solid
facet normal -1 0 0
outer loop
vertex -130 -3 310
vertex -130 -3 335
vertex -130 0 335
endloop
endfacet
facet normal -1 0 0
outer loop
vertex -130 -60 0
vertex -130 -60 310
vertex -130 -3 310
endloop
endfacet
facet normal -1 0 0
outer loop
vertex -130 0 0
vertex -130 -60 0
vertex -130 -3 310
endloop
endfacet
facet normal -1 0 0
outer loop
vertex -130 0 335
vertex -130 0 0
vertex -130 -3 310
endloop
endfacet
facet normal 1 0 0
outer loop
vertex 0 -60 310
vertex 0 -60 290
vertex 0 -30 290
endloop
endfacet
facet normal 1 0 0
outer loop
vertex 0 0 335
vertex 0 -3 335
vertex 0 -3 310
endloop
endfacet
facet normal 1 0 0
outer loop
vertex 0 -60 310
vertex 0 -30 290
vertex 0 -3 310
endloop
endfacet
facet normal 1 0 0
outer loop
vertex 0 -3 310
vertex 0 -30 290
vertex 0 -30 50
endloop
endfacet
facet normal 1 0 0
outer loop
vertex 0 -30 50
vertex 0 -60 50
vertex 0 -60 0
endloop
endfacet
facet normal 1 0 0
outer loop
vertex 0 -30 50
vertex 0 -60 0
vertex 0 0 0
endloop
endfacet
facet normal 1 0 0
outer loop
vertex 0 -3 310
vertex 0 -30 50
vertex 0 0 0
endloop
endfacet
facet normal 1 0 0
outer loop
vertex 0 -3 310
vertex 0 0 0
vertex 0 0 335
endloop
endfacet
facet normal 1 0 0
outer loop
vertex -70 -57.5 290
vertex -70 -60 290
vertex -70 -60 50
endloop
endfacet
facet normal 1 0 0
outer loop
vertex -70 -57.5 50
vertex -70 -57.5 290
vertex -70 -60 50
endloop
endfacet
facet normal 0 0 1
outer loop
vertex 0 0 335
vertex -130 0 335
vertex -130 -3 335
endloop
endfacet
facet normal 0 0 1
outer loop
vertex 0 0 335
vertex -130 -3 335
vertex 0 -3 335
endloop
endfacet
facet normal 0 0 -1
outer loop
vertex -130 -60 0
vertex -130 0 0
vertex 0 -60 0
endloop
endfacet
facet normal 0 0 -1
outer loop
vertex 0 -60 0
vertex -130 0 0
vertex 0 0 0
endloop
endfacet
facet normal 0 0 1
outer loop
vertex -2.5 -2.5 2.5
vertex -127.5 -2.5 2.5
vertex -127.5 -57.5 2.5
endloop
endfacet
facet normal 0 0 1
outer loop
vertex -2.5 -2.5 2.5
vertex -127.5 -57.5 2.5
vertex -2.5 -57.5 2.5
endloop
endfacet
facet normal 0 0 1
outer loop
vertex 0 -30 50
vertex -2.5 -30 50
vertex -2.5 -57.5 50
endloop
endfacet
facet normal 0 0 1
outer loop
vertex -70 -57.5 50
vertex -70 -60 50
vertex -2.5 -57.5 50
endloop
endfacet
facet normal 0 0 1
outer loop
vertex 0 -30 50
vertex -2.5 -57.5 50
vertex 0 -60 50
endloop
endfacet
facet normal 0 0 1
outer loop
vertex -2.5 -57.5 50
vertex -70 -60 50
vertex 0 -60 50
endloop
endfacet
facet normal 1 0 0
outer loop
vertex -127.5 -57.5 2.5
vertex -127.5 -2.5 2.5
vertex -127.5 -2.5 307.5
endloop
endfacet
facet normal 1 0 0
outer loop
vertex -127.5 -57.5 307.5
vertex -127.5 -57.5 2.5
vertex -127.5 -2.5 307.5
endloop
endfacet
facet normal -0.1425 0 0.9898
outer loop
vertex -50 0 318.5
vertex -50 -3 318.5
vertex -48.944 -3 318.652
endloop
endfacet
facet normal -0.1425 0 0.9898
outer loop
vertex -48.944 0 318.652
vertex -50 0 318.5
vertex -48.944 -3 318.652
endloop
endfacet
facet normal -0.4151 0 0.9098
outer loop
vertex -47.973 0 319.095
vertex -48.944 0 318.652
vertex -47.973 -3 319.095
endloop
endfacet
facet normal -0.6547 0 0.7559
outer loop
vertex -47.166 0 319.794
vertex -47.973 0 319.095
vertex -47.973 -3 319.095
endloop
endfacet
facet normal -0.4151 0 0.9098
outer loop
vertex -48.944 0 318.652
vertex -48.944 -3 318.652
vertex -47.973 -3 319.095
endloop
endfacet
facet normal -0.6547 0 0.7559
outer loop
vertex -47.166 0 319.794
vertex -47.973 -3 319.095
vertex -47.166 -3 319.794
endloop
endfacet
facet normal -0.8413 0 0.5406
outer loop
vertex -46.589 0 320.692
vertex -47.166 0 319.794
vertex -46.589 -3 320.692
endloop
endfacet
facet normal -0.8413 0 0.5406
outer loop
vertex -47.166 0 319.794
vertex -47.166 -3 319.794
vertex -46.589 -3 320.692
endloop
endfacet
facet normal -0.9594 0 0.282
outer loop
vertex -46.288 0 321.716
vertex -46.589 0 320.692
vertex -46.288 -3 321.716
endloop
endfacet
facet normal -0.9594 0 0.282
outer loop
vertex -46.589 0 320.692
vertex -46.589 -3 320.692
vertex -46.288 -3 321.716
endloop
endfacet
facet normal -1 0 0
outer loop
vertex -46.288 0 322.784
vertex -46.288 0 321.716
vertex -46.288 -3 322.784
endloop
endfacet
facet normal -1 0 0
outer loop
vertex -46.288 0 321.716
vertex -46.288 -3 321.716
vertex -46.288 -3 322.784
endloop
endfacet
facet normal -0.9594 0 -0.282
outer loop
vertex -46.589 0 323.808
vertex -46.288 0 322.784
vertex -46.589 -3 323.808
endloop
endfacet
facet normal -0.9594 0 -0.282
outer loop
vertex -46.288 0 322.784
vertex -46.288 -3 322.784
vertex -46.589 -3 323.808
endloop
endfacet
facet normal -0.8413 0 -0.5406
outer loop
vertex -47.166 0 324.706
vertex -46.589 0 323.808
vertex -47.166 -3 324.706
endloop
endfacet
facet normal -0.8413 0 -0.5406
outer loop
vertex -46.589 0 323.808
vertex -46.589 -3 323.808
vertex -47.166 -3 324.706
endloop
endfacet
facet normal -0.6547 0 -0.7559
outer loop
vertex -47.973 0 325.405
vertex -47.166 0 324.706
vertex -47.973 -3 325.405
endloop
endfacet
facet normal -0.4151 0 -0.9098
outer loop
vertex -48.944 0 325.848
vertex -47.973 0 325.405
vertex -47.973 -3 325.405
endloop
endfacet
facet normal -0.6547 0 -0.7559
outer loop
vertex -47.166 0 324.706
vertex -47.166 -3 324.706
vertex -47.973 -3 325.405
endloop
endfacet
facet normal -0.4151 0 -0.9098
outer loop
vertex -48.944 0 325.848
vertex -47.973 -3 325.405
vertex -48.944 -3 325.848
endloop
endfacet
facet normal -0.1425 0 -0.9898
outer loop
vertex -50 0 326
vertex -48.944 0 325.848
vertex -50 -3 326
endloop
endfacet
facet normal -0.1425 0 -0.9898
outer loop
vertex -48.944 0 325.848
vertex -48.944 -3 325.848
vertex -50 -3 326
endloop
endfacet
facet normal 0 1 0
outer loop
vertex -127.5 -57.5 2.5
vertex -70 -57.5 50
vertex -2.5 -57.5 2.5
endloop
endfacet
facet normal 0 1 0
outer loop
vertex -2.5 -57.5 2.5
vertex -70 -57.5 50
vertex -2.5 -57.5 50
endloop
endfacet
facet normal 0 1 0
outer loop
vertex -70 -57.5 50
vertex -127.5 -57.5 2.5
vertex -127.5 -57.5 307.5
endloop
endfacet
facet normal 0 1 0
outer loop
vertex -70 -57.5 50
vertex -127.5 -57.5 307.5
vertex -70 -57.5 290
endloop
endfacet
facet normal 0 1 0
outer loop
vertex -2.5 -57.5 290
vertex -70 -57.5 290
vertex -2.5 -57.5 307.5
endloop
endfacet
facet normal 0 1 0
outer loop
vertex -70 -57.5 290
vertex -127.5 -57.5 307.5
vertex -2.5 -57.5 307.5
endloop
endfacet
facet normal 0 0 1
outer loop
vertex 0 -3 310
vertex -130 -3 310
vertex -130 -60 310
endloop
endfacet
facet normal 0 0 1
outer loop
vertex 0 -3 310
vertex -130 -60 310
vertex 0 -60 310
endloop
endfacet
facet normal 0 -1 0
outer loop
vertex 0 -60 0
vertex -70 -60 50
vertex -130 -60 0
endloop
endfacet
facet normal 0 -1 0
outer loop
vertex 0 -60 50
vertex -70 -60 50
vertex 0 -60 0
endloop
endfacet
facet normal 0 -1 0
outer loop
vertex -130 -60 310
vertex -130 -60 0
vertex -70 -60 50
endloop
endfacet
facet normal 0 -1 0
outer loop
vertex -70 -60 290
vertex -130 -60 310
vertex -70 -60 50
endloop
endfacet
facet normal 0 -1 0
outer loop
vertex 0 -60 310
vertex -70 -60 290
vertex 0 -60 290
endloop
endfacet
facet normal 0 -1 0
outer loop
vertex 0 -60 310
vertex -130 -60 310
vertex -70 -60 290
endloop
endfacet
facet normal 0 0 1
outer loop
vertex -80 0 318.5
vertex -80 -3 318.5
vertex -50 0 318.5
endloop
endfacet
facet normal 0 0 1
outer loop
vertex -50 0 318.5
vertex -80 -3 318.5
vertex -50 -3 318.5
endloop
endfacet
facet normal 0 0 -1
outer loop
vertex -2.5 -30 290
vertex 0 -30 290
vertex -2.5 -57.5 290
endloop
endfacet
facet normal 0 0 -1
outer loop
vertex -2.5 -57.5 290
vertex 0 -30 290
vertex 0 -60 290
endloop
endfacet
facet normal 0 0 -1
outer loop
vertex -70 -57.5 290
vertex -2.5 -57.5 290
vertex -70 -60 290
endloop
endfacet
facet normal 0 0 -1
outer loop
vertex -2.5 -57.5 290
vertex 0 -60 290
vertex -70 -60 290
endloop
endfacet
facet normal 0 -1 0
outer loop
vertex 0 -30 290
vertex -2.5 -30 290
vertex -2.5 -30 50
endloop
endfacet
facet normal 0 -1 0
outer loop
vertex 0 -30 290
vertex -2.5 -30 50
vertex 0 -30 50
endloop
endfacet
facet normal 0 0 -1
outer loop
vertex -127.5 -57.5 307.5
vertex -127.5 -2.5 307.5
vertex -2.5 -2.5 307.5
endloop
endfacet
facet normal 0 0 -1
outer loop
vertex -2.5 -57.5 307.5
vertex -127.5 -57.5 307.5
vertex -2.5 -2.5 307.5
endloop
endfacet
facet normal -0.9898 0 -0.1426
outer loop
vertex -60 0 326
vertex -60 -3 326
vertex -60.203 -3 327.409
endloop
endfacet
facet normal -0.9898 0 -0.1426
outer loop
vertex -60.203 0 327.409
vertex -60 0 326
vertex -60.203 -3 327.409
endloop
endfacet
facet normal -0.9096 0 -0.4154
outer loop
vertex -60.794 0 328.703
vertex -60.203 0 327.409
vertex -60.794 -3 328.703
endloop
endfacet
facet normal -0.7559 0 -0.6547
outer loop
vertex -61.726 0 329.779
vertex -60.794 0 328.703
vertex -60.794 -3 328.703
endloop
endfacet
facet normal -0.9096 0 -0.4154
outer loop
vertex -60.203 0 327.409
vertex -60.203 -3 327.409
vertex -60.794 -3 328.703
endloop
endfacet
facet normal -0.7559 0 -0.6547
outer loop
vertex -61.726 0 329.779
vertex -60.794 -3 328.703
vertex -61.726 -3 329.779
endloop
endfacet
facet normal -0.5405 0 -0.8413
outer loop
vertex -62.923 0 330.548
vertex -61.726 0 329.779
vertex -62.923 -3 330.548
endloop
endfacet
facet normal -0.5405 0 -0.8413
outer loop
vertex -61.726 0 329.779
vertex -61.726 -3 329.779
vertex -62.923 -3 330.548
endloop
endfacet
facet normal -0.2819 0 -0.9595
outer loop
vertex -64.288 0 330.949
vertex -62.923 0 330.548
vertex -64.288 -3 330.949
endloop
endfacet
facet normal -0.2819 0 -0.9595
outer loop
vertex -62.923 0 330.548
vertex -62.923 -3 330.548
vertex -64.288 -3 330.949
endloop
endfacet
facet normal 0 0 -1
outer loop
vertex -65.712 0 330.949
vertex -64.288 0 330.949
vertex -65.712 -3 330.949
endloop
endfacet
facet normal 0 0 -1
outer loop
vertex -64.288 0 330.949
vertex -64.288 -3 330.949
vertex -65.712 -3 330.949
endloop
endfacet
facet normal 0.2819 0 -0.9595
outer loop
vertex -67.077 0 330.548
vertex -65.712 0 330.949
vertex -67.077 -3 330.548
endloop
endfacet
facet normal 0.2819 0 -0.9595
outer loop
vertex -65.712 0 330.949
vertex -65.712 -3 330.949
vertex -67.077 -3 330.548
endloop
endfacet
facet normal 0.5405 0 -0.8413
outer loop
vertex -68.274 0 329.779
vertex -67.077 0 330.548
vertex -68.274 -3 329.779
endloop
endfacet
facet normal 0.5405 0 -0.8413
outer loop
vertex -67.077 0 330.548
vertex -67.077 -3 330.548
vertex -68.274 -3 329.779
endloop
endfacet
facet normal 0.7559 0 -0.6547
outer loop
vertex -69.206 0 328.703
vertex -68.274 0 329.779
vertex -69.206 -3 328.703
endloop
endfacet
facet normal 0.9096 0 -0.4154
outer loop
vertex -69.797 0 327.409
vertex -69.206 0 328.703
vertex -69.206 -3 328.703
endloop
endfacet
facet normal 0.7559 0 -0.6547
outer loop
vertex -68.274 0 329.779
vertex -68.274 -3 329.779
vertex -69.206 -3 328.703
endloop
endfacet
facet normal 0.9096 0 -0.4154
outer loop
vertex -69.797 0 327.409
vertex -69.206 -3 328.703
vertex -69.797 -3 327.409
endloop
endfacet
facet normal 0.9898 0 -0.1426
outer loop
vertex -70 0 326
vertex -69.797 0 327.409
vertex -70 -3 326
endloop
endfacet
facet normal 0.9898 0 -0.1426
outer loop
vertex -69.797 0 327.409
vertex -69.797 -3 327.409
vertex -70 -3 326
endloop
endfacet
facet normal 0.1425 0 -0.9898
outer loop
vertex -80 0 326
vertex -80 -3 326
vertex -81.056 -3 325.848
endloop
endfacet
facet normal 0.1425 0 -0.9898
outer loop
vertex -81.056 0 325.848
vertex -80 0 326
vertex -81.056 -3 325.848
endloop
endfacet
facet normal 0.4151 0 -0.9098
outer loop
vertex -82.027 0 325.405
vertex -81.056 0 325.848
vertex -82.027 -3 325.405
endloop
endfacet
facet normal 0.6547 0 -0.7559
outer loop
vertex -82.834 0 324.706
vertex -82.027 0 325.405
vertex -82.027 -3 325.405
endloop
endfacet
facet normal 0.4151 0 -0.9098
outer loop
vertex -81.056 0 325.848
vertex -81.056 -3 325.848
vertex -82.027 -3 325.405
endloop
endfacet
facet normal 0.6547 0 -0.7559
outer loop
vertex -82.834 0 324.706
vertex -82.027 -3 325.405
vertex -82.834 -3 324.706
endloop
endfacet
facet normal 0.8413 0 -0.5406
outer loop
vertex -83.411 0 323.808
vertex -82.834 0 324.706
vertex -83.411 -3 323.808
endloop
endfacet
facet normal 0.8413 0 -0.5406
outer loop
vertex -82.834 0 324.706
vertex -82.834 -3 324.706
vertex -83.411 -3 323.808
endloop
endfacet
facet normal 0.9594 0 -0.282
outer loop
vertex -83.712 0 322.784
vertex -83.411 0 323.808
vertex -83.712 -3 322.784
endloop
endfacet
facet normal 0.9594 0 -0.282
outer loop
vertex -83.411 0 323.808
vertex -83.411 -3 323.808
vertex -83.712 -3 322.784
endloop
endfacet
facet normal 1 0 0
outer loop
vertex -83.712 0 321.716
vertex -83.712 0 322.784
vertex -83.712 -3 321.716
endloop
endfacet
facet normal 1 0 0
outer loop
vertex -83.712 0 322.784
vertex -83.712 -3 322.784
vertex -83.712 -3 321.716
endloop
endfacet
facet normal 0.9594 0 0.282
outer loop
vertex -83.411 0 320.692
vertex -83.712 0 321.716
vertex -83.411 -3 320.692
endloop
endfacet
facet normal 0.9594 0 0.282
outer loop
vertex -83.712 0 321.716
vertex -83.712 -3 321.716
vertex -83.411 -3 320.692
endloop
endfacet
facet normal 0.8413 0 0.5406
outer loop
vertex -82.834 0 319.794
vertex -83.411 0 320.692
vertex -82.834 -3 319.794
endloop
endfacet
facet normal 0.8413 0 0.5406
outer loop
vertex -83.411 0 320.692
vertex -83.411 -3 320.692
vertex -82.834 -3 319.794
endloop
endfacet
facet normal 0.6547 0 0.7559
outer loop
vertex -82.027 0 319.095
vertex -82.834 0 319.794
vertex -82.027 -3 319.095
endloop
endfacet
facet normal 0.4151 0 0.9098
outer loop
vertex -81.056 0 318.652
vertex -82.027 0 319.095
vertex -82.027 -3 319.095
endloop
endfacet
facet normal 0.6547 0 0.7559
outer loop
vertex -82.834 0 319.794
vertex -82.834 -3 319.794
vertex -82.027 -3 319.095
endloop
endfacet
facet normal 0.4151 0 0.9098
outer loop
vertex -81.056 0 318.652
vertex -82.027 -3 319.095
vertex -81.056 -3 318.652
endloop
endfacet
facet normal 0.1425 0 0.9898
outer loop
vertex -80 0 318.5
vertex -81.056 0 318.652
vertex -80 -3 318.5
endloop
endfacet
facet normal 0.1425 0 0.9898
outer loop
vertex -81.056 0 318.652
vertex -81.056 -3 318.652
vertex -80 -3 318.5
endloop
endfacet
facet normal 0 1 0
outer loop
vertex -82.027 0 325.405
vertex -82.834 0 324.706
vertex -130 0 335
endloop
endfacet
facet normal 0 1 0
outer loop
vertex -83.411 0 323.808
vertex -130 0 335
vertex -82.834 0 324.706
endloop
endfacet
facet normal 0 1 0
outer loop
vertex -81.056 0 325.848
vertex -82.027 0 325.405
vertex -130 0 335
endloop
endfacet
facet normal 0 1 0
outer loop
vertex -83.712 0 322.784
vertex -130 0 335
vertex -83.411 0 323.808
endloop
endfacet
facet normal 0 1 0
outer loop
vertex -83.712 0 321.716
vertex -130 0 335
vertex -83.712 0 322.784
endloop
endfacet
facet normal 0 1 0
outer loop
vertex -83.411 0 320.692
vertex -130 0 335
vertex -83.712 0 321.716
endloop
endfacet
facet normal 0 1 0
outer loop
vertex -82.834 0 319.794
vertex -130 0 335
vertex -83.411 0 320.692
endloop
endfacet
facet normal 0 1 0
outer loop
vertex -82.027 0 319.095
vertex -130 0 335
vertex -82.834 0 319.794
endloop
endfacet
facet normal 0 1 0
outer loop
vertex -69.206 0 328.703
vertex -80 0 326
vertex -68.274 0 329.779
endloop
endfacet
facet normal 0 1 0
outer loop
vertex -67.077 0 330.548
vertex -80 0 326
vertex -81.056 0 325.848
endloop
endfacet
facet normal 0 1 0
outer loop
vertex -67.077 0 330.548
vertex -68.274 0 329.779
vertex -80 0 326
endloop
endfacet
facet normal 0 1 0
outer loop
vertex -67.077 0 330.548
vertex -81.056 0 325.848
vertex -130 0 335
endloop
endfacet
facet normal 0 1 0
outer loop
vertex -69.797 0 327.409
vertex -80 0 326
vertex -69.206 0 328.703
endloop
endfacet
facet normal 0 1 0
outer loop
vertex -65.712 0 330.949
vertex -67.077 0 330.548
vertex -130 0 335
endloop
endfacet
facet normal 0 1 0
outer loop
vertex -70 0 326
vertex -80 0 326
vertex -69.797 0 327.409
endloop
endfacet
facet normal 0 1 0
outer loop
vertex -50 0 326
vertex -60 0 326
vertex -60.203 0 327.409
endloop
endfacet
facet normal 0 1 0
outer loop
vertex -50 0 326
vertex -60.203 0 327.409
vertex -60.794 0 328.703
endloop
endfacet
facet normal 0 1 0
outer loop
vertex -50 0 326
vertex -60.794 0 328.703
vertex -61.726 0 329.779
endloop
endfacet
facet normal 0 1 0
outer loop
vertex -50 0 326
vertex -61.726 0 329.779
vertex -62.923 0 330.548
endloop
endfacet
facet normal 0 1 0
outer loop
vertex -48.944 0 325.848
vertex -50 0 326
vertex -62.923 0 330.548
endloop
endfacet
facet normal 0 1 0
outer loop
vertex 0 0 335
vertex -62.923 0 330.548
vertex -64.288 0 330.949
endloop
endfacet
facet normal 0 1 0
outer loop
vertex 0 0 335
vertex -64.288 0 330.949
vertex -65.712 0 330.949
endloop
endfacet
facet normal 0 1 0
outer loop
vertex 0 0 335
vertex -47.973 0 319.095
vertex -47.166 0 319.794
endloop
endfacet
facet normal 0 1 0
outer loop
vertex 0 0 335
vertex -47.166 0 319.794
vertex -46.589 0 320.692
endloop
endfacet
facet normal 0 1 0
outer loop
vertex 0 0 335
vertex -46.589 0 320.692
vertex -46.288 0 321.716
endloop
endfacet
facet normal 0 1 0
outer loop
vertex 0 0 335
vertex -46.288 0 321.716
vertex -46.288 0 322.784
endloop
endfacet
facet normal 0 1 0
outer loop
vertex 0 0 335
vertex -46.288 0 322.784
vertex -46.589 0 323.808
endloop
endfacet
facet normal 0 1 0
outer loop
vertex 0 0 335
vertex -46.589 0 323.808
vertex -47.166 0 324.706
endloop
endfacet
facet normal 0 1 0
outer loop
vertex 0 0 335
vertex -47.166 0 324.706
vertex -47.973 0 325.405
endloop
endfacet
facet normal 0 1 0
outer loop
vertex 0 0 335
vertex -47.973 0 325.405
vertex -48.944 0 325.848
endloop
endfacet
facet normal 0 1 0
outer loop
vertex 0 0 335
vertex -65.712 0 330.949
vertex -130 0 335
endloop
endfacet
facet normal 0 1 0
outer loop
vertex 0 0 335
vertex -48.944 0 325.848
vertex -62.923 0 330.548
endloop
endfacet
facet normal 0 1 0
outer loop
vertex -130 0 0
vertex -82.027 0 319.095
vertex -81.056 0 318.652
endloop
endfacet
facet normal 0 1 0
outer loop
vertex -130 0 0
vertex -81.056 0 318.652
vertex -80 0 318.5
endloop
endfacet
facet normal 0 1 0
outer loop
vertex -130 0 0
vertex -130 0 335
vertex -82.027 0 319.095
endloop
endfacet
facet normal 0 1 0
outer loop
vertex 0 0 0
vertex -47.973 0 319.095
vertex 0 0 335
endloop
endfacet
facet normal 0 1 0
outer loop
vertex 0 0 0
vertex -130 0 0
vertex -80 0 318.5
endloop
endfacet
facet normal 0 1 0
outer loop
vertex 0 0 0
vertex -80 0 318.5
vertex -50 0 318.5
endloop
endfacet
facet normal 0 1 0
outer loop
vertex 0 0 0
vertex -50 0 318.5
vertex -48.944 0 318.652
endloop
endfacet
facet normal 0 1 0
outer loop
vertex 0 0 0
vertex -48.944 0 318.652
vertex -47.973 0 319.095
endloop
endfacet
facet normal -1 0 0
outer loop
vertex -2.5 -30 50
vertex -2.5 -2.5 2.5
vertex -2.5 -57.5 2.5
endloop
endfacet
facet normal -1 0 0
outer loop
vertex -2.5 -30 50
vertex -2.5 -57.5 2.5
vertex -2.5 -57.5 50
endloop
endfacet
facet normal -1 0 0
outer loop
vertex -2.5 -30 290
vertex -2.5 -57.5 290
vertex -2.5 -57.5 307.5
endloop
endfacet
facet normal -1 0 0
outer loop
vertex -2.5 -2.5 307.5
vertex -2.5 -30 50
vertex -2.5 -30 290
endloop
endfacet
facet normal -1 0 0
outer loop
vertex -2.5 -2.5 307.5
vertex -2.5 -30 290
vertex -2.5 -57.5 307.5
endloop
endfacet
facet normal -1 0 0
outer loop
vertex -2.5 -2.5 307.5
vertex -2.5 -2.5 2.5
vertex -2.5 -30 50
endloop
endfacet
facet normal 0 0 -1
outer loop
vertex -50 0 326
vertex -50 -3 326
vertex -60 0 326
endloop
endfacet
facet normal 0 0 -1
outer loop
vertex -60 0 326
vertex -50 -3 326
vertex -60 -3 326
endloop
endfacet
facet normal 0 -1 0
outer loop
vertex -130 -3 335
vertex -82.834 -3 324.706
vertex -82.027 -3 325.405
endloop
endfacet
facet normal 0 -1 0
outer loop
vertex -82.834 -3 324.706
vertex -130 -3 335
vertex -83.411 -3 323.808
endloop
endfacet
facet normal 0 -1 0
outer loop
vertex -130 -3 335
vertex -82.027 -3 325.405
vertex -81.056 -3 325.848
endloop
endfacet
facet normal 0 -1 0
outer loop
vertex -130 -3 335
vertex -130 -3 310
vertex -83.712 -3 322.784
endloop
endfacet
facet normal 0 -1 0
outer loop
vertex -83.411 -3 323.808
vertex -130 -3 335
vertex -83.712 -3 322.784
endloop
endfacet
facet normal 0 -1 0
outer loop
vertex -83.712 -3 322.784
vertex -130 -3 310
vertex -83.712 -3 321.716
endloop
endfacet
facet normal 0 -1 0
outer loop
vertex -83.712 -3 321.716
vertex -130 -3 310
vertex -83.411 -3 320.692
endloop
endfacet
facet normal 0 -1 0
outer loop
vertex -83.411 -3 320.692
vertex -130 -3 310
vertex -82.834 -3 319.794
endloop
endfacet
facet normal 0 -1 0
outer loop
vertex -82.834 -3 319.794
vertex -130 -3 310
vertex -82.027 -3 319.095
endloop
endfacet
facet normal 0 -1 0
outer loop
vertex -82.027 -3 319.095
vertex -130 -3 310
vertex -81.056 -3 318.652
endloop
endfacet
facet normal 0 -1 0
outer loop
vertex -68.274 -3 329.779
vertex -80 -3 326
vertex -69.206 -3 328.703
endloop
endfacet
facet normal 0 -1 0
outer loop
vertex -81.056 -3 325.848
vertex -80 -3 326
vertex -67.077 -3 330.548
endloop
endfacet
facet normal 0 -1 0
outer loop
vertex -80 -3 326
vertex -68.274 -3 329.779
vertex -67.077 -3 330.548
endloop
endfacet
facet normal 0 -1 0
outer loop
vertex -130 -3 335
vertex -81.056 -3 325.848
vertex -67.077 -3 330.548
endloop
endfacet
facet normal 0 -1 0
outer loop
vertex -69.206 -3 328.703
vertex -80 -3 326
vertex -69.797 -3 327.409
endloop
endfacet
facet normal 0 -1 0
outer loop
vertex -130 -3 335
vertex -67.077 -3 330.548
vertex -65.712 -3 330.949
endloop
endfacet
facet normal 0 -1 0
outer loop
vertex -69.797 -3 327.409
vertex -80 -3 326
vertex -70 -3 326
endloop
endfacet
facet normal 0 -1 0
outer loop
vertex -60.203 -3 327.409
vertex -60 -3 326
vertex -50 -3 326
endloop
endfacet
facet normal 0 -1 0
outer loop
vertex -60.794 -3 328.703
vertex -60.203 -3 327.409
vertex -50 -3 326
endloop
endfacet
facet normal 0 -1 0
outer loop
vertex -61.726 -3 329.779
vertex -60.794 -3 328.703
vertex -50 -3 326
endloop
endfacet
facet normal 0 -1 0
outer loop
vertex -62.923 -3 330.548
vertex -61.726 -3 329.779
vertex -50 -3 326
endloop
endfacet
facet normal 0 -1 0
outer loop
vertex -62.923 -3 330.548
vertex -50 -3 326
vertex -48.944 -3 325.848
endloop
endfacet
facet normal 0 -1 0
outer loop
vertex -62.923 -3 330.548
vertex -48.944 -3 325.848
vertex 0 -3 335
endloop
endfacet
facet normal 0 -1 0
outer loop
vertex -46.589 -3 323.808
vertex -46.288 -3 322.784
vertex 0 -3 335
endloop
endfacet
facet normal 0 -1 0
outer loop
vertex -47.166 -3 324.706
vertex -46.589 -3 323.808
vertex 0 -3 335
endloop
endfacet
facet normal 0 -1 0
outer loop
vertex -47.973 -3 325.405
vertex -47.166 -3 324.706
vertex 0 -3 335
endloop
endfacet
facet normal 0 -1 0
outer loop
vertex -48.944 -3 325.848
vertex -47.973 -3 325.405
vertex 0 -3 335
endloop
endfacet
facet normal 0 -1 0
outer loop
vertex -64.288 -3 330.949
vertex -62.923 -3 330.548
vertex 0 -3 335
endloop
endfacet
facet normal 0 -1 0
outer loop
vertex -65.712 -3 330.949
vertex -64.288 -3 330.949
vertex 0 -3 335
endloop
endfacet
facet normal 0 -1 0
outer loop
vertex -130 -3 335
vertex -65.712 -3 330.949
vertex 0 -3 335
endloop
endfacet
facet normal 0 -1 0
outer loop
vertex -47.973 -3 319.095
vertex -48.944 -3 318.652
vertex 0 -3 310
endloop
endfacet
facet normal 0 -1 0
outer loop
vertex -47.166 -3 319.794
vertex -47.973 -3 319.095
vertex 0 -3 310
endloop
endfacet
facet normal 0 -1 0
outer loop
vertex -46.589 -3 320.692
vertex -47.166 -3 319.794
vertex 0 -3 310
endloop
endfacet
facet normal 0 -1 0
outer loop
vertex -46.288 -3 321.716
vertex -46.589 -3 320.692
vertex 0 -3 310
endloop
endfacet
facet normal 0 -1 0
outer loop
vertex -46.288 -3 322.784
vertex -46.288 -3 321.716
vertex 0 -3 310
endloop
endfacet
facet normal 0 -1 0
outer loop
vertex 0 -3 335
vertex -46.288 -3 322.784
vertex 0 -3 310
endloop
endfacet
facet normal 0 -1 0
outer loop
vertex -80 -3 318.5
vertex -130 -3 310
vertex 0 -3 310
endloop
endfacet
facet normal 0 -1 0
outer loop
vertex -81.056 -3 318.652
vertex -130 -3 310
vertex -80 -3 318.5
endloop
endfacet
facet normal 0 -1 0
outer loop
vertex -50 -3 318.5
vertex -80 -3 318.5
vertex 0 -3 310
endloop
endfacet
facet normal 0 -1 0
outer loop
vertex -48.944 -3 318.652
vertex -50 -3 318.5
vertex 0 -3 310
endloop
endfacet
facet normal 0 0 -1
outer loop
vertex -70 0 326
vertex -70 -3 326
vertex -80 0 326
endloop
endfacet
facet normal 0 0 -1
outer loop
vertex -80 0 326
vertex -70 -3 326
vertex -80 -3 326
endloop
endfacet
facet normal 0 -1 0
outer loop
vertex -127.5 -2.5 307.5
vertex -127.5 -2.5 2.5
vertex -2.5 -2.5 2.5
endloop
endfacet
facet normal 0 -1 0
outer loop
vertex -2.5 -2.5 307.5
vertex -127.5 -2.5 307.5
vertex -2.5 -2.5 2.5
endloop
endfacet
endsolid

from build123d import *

# Parameters (mm, degrees)
F0_W      = 130
F0_H      = 310
F1_DEPTH  = 60
F3_DEPTH  = 30
F4_T      = -2.5
F5_W      = 130
F5_H      = 3
F6_DEPTH  = 25
F10_DEPTH = 3.001
F11_DEPTH = 25
F12_DEPTH = 3.001


# Not quite as in the source:
# - a feature of the source that left no trace in its solid (it failed there, or was rolled back) is left out


with BuildPart() as f1:
    # F0 (on Front) → F1 (new body)
    with BuildSketch(Plane.XZ):
        with Locations((-65, 155)):
            Rectangle(F0_W, F0_H)
    extrude(amount=F1_DEPTH)

    # F2 (on face) → F3 (cut)
    with BuildSketch(Plane.XZ.offset(60)):
        Polygon((0, 50), (0, 290), (-70, 290), (-70, 50), (-48.1321327388, 50), align=None)
    extrude(amount=-F3_DEPTH, mode=Mode.SUBTRACT)

    # F4
    f4_openings = [f1.faces().sort_by_distance(p)[0] for p in [
        (-35, -45, 50),
        (-70, -45, 170),
        (-35, -30, 170),
        (-35, -45, 290),
    ]]
    offset(amount=F4_T, openings=f4_openings)

    # F5 (on face) → F6 (join)
    with BuildSketch(Plane.XY.offset(310)):
        with Locations((-65, -1.5)):
            Rectangle(F5_W, F5_H)
    extrude(amount=F6_DEPTH)

    # F9 (on face) → F10 (cut, through all)
    with BuildSketch(Plane.XZ.offset(3)):
        with BuildLine():
            Line((-50, 326), (-60, 326))
            ThreePointArc((-60, 326), (-65, 331), (-70, 326))
            Line((-70, 326), (-80, 326))
            ThreePointArc((-80, 326), (-83.75, 322.25), (-80, 318.5))
            Line((-80, 318.5), (-50, 318.5))
            ThreePointArc((-50, 318.5), (-46.25, 322.25), (-50, 326))
        make_face()
    extrude(amount=-F10_DEPTH, mode=Mode.SUBTRACT)

    # F5 (on face) → F11 (join)
    with BuildSketch(Plane.XY.offset(310)):
        with Locations((-65, -1.5)):
            Rectangle(F5_W, F5_H)
    extrude(amount=F11_DEPTH)

    # F9 (on face) → F12 (cut, through all)
    with BuildSketch(Plane.XZ.offset(3)):
        with BuildLine():
            Line((-50, 326), (-60, 326))
            ThreePointArc((-60, 326), (-65, 331), (-70, 326))
            Line((-70, 326), (-80, 326))
            ThreePointArc((-80, 326), (-83.75, 322.25), (-80, 318.5))
            Line((-80, 318.5), (-50, 318.5))
            ThreePointArc((-50, 318.5), (-46.25, 322.25), (-50, 326))
        make_face()
    extrude(amount=-F12_DEPTH, mode=Mode.SUBTRACT)


solid = f1.part
